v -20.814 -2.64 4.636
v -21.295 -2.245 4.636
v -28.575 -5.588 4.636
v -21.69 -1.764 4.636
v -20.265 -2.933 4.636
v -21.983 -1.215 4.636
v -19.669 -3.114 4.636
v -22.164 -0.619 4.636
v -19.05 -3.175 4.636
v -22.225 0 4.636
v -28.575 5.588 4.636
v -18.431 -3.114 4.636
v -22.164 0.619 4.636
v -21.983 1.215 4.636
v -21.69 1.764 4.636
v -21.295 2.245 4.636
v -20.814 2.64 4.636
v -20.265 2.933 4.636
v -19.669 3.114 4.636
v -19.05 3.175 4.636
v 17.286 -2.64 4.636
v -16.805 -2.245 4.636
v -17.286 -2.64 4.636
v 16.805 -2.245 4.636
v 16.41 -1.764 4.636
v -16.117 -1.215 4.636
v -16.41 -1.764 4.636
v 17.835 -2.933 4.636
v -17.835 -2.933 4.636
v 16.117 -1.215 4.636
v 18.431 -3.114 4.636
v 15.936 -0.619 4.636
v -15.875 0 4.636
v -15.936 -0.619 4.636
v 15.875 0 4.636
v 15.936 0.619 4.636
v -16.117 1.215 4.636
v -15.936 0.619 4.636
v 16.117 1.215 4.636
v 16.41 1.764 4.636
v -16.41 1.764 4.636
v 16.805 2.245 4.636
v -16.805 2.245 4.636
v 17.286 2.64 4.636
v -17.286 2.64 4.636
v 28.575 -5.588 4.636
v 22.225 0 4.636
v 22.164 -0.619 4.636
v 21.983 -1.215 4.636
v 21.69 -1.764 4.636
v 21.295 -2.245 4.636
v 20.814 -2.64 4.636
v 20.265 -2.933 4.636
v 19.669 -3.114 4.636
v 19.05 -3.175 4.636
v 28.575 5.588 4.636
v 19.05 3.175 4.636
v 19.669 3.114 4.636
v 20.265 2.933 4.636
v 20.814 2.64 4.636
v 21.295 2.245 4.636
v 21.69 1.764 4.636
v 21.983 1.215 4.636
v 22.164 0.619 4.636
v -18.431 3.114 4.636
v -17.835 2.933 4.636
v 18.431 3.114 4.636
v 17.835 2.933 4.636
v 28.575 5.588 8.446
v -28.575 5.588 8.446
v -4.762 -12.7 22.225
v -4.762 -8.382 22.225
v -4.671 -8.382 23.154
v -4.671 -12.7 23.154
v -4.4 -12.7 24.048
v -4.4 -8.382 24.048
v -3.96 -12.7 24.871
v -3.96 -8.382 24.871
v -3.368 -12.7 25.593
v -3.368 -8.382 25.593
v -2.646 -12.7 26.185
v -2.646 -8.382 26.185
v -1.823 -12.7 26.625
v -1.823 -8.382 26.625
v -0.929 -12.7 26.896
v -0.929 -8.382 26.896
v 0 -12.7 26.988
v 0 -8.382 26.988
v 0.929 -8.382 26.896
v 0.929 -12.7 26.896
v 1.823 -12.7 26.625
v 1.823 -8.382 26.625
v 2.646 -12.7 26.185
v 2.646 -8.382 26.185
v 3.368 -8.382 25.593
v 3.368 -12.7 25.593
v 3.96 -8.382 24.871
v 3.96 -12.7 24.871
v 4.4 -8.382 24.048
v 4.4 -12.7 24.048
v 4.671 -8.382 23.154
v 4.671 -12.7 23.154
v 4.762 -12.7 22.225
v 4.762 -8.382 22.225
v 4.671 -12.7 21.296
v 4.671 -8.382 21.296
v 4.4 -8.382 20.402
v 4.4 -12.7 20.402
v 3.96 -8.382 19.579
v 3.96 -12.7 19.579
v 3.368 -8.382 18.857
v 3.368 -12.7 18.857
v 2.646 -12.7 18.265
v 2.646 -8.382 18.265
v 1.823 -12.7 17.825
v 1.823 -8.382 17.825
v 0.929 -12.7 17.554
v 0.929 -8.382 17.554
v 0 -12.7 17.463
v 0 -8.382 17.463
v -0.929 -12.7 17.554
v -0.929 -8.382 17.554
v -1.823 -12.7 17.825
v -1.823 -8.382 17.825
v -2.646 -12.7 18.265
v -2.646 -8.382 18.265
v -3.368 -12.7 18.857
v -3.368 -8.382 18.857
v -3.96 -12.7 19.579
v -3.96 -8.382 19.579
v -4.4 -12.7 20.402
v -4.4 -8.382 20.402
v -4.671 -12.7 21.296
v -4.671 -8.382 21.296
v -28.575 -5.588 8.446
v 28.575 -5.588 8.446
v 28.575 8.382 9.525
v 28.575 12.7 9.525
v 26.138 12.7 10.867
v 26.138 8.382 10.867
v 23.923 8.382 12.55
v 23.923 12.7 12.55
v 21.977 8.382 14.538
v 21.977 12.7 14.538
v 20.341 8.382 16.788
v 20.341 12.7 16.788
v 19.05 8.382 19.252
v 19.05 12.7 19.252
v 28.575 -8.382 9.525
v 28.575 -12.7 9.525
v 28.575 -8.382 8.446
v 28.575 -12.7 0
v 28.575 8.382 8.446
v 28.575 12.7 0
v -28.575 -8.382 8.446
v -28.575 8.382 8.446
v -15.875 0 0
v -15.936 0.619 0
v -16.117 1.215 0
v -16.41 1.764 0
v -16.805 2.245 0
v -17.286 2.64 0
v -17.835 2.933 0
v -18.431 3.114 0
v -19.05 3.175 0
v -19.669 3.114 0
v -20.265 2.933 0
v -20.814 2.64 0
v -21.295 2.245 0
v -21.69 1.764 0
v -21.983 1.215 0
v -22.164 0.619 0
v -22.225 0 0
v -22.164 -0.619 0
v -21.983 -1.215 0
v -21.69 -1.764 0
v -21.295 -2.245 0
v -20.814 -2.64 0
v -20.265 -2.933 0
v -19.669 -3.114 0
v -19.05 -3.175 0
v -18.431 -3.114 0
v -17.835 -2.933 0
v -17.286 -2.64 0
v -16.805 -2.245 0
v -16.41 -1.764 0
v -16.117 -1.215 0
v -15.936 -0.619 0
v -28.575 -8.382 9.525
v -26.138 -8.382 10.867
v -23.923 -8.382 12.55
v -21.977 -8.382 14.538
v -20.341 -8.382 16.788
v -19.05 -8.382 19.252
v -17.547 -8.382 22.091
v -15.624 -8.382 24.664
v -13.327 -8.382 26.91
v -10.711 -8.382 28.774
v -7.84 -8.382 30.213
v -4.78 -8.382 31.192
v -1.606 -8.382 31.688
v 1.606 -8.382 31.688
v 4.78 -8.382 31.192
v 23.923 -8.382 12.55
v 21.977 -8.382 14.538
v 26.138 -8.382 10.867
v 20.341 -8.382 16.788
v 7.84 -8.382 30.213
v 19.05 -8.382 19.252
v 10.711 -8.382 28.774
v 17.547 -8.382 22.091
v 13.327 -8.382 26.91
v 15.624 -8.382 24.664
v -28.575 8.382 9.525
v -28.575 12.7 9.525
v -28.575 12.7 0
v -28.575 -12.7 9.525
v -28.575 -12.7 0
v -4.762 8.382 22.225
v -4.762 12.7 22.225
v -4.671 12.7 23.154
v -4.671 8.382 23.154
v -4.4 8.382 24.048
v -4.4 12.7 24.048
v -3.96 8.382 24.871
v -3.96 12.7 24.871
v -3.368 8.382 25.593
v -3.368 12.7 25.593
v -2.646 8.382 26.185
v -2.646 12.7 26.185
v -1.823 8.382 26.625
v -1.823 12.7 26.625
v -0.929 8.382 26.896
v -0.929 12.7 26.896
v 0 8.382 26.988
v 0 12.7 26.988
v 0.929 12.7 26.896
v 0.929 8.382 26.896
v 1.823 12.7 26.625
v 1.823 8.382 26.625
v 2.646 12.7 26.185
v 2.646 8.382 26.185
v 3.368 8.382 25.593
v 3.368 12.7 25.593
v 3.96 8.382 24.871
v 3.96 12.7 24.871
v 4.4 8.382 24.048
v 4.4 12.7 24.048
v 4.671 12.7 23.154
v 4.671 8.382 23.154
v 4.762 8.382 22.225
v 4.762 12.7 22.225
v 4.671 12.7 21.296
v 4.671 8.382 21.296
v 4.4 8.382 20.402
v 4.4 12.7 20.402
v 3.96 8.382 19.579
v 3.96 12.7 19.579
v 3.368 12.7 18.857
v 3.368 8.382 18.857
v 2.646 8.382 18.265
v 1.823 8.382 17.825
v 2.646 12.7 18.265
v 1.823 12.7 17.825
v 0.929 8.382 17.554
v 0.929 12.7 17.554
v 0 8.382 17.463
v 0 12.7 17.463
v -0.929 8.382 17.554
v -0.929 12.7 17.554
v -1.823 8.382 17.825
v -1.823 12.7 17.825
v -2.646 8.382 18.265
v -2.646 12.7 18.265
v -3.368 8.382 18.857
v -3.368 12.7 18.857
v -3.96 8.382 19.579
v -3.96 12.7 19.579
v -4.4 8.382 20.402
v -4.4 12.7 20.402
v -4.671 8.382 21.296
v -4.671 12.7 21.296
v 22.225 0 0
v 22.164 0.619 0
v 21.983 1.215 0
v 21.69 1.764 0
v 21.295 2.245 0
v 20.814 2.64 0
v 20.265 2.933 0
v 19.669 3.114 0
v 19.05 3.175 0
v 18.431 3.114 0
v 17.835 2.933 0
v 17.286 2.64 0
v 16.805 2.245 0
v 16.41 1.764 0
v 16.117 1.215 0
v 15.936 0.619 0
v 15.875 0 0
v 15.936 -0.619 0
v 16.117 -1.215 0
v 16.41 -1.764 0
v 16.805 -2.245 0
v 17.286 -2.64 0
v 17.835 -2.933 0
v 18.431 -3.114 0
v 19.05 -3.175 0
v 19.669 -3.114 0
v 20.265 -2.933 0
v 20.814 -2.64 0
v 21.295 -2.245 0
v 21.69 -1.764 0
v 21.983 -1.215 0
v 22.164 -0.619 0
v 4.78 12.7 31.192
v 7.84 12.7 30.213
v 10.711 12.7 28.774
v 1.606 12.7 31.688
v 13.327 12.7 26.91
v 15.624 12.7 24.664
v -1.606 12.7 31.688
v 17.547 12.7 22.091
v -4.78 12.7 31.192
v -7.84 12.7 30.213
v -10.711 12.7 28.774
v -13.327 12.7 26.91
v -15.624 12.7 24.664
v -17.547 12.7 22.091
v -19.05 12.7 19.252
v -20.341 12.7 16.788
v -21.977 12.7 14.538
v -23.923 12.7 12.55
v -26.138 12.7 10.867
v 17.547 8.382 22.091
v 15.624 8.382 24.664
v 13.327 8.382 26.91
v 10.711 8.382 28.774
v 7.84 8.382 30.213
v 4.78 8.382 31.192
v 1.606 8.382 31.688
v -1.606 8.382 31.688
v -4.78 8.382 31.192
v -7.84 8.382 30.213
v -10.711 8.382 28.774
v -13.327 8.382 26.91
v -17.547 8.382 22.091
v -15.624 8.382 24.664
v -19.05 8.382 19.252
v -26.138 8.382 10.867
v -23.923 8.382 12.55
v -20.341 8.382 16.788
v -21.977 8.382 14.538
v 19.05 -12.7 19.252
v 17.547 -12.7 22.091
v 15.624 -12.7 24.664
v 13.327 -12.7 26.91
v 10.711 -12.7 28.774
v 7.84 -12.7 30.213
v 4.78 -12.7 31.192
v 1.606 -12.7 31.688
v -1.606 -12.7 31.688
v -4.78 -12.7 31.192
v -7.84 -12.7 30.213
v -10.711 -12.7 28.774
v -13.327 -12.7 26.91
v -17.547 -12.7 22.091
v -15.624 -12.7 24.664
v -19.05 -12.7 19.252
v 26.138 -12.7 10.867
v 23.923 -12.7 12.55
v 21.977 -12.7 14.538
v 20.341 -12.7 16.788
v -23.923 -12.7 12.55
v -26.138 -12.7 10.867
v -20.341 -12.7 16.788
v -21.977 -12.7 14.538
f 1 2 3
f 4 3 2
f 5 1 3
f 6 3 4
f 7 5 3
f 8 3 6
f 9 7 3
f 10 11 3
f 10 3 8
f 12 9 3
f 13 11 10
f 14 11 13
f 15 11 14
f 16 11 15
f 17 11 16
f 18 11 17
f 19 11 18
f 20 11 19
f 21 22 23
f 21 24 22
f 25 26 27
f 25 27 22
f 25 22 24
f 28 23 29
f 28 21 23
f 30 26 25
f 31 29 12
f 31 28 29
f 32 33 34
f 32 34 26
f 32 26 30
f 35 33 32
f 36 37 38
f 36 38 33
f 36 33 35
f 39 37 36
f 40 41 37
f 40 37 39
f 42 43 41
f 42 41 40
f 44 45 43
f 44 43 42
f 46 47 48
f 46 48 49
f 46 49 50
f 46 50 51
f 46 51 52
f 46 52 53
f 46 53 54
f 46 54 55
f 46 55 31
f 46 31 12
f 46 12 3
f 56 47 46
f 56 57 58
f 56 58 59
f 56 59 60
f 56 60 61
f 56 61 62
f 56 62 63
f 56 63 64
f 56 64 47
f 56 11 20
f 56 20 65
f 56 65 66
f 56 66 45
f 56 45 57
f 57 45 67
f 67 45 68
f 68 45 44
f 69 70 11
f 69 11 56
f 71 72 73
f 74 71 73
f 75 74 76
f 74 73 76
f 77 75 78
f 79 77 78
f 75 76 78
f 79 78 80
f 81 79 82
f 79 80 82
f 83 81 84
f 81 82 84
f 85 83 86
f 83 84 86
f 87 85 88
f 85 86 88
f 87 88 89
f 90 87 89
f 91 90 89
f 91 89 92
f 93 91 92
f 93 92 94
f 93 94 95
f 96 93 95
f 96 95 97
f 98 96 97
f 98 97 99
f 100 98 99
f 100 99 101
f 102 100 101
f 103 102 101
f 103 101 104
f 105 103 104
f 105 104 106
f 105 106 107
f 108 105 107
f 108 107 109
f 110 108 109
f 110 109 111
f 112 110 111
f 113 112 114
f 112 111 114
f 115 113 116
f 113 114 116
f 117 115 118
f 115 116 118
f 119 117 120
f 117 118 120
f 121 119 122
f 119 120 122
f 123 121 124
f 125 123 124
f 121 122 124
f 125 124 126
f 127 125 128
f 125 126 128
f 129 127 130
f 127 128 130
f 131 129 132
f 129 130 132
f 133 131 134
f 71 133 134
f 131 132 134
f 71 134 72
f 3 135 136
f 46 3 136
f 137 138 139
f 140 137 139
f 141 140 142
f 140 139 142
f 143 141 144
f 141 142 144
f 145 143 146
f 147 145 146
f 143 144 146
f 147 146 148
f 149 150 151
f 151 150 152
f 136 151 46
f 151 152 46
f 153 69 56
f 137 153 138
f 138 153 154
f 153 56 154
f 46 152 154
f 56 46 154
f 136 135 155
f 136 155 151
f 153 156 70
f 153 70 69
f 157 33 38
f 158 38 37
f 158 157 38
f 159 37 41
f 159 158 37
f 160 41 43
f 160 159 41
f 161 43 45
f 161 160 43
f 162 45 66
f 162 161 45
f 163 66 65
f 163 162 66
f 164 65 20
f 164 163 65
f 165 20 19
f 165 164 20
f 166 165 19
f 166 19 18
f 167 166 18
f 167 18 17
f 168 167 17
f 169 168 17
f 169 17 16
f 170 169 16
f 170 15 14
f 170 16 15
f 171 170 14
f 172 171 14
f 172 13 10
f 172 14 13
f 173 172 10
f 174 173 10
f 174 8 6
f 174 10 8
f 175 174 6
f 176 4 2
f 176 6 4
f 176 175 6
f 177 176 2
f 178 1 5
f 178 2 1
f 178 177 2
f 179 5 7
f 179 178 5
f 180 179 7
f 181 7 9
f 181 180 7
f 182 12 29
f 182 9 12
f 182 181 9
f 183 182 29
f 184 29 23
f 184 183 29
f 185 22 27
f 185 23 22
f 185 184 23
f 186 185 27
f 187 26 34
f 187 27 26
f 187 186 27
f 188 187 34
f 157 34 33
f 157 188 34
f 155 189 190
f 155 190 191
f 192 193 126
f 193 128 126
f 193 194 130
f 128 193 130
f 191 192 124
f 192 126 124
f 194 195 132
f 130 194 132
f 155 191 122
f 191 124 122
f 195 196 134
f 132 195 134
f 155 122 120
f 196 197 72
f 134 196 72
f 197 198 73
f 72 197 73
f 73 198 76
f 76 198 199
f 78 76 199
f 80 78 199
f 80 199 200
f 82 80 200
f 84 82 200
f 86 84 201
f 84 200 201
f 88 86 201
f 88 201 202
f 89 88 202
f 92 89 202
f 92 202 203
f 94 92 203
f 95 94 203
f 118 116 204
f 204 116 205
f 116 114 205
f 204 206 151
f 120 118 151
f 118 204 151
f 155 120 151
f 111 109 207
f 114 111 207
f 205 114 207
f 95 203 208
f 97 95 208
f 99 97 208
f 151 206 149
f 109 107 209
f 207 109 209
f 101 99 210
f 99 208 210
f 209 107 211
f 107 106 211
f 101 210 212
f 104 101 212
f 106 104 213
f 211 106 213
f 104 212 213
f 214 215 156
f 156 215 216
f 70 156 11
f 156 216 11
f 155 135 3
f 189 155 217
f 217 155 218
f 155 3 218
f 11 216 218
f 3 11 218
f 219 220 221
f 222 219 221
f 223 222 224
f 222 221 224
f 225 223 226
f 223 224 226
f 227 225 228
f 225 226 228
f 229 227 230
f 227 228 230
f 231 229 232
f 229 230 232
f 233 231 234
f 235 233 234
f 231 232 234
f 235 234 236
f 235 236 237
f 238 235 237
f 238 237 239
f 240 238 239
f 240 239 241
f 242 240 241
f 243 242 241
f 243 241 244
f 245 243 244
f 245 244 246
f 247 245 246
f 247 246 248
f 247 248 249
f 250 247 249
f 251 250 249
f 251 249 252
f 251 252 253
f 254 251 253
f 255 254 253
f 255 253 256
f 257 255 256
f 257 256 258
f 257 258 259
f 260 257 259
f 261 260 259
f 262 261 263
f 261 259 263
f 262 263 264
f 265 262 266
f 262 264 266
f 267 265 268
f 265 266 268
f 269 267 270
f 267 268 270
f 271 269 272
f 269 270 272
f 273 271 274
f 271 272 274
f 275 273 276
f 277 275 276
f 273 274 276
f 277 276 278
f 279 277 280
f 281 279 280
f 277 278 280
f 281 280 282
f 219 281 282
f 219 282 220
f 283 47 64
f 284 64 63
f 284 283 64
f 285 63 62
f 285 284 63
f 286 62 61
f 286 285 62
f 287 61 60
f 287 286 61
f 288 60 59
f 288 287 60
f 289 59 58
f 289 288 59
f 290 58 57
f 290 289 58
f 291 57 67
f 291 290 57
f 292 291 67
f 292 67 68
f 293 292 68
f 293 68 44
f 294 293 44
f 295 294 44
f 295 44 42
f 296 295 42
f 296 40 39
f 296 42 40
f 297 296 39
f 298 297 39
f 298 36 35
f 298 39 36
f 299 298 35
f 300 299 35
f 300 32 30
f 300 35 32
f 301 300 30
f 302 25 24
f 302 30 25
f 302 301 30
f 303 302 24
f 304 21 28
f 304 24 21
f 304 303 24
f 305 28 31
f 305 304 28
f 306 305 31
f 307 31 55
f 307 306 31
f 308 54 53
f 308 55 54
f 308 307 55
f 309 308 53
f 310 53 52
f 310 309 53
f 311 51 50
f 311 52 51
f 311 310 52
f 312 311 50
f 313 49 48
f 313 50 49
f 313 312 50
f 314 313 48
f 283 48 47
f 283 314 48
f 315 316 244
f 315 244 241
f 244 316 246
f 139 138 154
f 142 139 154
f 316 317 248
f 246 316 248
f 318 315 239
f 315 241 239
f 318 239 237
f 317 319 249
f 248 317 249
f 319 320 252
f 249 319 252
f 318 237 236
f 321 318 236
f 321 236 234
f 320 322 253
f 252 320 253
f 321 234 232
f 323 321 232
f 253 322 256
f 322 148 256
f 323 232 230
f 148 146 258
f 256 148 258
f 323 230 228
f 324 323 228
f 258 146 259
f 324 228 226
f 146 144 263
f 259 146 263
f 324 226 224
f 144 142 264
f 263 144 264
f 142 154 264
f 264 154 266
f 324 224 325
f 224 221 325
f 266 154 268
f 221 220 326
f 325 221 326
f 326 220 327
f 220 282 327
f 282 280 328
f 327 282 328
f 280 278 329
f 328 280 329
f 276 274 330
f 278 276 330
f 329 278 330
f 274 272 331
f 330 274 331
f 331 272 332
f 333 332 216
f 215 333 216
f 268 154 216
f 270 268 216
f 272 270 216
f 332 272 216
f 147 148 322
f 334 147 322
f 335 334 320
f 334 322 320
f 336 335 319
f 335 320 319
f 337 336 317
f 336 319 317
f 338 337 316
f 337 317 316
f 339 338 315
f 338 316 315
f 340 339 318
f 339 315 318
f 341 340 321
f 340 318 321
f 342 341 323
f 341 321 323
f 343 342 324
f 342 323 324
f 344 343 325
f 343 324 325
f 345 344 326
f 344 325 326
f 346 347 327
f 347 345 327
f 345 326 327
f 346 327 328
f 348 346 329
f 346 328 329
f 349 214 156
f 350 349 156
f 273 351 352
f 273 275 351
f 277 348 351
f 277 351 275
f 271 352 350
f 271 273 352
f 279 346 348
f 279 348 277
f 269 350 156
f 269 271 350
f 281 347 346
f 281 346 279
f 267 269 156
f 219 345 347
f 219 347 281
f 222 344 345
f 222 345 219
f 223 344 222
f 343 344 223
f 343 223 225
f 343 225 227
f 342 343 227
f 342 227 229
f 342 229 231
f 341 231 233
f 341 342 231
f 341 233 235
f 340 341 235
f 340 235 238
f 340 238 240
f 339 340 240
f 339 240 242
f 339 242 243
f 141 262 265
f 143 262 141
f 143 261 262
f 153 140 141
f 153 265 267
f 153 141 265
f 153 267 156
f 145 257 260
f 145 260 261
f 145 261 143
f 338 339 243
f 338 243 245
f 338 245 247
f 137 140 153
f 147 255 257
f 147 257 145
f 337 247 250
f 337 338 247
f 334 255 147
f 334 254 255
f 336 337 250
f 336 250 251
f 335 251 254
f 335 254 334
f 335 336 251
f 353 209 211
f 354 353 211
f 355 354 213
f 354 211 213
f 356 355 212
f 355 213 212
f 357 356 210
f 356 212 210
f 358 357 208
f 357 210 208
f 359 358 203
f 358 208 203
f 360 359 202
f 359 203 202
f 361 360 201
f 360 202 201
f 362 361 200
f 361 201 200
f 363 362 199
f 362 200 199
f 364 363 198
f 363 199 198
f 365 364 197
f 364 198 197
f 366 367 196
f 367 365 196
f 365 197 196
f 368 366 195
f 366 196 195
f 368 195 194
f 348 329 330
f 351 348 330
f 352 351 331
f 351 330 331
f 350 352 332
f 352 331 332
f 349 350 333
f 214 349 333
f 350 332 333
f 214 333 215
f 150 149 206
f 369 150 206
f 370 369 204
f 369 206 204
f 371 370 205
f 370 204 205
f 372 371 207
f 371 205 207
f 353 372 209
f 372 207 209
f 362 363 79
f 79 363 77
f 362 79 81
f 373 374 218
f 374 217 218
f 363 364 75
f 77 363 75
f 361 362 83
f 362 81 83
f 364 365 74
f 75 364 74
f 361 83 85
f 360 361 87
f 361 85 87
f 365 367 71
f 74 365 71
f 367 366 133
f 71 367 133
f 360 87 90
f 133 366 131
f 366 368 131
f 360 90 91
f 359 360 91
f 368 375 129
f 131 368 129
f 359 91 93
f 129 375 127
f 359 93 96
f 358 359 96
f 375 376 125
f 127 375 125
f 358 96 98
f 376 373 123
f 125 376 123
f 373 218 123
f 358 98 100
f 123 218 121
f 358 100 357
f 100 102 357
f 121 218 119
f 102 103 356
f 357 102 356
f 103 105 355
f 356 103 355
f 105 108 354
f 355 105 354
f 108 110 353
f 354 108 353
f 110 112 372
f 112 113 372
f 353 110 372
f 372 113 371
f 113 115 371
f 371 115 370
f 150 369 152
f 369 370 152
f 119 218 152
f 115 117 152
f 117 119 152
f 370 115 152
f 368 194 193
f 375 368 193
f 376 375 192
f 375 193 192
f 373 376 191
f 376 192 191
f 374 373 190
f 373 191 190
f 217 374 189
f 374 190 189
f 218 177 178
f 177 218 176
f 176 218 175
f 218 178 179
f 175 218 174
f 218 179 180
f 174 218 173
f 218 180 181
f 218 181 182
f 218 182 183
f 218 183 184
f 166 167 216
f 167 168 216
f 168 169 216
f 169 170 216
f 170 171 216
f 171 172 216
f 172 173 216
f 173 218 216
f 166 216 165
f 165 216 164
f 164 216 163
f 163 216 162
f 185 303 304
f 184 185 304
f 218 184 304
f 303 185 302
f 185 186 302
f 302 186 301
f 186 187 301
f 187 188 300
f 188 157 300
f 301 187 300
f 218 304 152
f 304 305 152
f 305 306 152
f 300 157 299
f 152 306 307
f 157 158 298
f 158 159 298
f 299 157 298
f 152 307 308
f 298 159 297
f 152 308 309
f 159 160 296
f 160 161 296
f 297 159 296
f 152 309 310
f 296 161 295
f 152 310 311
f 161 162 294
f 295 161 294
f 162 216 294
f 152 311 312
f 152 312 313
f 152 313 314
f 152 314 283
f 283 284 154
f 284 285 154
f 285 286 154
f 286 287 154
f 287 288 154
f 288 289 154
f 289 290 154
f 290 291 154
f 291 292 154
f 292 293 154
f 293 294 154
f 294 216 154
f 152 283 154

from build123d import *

# Parameters (mm, degrees)
SKETCH2_R      = 3.175
EXTRUDE1_DEPTH = 38.1
SKETCH3_W      = 57.15
SKETCH3_H      = 11.176
EXTRUDE2_DEPTH = 33.4645
SKETCH4_W      = 57.15
SKETCH4_H      = 16.764
EXTRUDE3_DEPTH = 29.6545
SKETCH5_R      = 4.7625
EXTRUDE4_DEPTH = 26.4
EXTRUDE5_DEPTH = 26.4


with BuildPart() as part:
    # Sketch2 → Extrude1 (new body)
    with BuildSketch(Plane.XY):
        Polygon((-22.225, 12.7), (-28.575, 12.7), (-28.575, -12.7), (-22.225, -12.7), (22.225, -12.7), (28.575, -12.7), (28.575, 12.7), (22.225, 12.7), align=None)
        with Locations((19.05, 0)):
            Circle(SKETCH2_R, mode=Mode.SUBTRACT)
        with Locations((-19.05, 0)):
            Circle(SKETCH2_R, mode=Mode.SUBTRACT)
    extrude(amount=EXTRUDE1_DEPTH)

    # Sketch3 → Extrude2 (cut)
    with BuildSketch(Plane.XY.offset(38.1)):
        Rectangle(SKETCH3_W, SKETCH3_H)
    extrude(amount=-EXTRUDE2_DEPTH, mode=Mode.SUBTRACT)

    # Sketch4 → Extrude3 (cut)
    with BuildSketch(Plane.XY.offset(38.1)):
        Rectangle(SKETCH4_W, SKETCH4_H)
    extrude(amount=-EXTRUDE3_DEPTH, mode=Mode.SUBTRACT)

    # Sketch5 → Extrude4 (cut, through all)
    with BuildSketch(Plane(origin=(0, 12.7, 0), x_dir=(-1, 0, 0), z_dir=(0, 1, 0))):
        with Locations((0, 22.225)):
            Circle(SKETCH5_R)
    extrude(amount=-EXTRUDE4_DEPTH, mode=Mode.SUBTRACT)

    # Sketch6 → Extrude5 (cut, through all)
    with BuildSketch(Plane(origin=(0, 12.7, 0), x_dir=(1, 0, 0), z_dir=(0, 1, 0))):
        with BuildLine():
            Line((-28.575, -9.525), (-28.575, -38.1))
            Line((-28.575, -38.1), (28.575, -38.1))
            Line((28.575, -38.1), (28.575, -9.525))
            ThreePointArc((28.575, -9.525), (22.913958086, -13.508463236), (19.05, -19.25173781))
            ThreePointArc((19.05, -19.25173781), (0, -31.75), (-19.05, -19.25173781))
            ThreePointArc((-19.05, -19.25173781), (-22.913958086, -13.508463236), (-28.575, -9.525))
        make_face()
    extrude(amount=-EXTRUDE5_DEPTH, mode=Mode.SUBTRACT)


solid = part.part
